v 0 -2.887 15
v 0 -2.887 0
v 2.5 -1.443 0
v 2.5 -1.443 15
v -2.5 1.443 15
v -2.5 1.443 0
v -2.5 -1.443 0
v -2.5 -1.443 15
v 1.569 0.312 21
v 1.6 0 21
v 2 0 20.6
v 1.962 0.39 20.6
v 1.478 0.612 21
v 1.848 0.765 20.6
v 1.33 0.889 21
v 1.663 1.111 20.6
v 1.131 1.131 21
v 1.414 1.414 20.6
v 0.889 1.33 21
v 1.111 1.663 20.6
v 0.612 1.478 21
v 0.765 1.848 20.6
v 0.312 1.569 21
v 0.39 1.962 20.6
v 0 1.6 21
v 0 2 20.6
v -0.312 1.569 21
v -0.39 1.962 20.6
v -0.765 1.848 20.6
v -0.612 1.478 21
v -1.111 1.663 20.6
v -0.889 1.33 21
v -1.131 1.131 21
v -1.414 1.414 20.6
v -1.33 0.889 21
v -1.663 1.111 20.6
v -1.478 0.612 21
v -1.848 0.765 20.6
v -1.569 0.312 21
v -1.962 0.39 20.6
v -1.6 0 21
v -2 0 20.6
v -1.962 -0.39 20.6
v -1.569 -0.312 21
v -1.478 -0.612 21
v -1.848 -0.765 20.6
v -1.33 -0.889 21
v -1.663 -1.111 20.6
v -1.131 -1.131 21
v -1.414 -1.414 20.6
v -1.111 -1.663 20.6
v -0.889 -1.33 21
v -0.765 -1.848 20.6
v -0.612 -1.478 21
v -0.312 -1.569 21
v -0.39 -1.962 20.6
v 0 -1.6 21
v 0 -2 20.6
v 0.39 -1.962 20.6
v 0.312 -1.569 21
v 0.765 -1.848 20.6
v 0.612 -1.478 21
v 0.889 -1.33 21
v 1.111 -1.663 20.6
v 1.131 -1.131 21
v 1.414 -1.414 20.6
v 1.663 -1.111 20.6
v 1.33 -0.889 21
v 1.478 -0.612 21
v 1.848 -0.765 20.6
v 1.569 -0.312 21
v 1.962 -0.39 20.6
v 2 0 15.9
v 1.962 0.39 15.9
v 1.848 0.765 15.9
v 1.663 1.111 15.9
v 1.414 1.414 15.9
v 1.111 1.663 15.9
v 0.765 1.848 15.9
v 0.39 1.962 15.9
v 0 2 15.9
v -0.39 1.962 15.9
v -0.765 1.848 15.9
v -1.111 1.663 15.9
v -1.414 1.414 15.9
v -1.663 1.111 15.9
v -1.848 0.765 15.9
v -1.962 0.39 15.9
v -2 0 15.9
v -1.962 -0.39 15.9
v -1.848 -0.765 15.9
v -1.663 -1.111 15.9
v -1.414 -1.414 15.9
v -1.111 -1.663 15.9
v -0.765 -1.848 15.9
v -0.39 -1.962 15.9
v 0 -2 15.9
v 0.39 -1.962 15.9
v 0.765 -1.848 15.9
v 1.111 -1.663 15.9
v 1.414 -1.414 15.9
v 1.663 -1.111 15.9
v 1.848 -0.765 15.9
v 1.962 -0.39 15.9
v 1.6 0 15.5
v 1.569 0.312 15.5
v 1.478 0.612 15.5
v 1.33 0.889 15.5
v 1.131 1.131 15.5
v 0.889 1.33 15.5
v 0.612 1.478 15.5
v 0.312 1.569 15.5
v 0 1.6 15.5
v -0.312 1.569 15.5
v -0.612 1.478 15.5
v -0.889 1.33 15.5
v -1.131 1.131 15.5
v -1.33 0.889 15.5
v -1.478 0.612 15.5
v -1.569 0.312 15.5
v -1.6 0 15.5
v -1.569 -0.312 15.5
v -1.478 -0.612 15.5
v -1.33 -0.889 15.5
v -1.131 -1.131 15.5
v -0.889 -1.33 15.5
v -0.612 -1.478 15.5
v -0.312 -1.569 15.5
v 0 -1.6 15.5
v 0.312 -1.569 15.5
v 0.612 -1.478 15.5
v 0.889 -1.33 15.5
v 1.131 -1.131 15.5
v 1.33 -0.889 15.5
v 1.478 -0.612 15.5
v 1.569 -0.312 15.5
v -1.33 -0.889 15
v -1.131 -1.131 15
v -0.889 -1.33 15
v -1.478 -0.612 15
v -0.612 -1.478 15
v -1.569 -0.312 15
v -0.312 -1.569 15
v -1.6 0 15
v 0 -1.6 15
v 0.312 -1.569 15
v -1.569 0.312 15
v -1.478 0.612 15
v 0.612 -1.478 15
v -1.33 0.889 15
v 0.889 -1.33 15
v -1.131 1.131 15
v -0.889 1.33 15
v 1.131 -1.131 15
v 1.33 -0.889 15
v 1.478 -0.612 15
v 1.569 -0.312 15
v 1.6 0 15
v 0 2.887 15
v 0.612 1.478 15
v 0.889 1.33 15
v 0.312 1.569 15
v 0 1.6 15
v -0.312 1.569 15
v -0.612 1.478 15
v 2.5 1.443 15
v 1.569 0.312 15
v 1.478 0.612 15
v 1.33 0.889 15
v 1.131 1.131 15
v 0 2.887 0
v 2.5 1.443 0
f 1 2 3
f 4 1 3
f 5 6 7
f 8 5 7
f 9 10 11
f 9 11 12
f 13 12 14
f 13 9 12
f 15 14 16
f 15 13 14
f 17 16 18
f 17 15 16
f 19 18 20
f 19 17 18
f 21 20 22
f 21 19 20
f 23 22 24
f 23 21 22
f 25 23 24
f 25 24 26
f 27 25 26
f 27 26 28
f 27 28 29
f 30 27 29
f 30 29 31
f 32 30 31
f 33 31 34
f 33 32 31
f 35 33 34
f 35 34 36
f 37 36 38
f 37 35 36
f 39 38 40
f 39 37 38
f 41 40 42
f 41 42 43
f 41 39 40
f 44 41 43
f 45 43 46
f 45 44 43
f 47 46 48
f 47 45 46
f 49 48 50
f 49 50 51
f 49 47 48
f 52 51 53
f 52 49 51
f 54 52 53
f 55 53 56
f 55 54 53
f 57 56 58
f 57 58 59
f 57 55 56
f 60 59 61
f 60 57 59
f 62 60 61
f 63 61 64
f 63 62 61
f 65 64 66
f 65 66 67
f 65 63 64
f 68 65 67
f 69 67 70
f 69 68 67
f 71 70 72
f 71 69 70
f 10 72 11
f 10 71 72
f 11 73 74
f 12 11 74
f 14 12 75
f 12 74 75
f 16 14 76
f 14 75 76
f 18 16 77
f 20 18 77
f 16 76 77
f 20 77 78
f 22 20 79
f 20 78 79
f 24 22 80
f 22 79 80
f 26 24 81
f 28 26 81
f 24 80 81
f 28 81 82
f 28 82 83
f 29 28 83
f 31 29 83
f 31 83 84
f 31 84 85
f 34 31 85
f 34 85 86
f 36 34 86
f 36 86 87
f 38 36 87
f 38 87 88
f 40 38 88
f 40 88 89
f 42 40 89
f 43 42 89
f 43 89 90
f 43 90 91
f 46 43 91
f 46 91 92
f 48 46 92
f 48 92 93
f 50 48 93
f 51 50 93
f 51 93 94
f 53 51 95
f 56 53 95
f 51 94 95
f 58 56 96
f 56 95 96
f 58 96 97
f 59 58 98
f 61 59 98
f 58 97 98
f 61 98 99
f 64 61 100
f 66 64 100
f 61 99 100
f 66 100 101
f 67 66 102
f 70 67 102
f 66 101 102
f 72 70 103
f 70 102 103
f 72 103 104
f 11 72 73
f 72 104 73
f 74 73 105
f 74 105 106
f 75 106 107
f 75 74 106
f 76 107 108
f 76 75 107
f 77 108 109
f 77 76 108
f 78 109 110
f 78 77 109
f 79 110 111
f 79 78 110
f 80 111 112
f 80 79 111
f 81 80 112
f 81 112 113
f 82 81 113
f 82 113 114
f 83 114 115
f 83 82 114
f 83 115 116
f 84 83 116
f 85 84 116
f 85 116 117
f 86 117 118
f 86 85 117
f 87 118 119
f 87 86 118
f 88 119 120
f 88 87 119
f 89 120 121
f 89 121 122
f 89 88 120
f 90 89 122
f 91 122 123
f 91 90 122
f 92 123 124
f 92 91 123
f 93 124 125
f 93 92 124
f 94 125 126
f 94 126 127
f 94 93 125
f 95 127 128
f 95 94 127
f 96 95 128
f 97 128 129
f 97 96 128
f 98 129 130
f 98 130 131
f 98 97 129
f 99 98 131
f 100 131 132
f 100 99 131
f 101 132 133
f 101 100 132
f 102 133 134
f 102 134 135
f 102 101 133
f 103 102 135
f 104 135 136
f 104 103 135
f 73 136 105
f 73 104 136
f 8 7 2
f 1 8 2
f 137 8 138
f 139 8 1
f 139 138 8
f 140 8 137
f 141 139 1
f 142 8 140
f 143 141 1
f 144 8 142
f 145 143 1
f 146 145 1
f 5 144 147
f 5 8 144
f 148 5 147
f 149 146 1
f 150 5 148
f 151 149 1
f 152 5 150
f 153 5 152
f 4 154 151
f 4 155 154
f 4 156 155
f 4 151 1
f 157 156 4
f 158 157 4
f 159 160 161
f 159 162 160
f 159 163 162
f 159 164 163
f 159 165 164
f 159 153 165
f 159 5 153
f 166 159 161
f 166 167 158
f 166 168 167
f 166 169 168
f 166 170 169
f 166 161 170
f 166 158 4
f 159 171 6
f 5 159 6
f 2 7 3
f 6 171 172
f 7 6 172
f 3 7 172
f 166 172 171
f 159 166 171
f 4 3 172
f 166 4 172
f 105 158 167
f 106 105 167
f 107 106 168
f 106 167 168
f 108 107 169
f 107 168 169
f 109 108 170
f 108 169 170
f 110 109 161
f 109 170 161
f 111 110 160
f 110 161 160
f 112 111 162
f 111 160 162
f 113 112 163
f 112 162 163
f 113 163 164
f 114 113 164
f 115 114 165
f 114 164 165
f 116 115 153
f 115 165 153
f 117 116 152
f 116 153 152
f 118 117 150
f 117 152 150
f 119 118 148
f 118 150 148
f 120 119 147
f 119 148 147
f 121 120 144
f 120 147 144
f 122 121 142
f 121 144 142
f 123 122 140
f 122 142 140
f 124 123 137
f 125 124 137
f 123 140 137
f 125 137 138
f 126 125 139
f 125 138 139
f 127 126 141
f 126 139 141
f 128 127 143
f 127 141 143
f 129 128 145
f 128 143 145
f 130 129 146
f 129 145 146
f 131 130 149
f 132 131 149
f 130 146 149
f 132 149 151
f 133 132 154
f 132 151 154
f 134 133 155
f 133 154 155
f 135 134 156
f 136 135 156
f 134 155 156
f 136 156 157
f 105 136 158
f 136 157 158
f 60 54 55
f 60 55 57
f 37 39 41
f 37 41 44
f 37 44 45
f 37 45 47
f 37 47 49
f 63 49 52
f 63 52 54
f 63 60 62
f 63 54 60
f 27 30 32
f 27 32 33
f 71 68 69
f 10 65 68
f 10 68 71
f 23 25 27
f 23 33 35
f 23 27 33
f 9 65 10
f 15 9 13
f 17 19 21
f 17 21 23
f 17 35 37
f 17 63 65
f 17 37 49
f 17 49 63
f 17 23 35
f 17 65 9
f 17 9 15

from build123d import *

# Parameters (mm, degrees)
EXTRUDE_1_DEPTH     = 15
SKETCH_2_R          = 2
EXTRUDE_2_DEPTH     = 6
SKETCH_3_R          = 2
SKETCH_3_R_2        = 1.6
CUT_EXTRUDE_3_DEPTH = 0.5
CHAMFER_1_SIZE      = 0.4


with BuildPart() as part:
    # Эскиз1 → Вытянуть1 (new body)
    with BuildSketch(Plane.XY):
        Polygon((0, 2.886751346), (-2.5, 1.443375673), (-2.5, -1.443375673), (0, -2.886751346), (2.5, -1.443375673), (2.5, 1.443375673), align=None)
    extrude(amount=EXTRUDE_1_DEPTH)

    # Эскиз2 → Вытянуть2 (add)
    with BuildSketch(Plane.XY.offset(15)):
        Circle(SKETCH_2_R)
    extrude(amount=EXTRUDE_2_DEPTH)

    # Эскиз3 → Вырез-Вытянуть3 (cut)
    with BuildSketch(Plane.XY.offset(15)):
        Circle(SKETCH_3_R)
        Circle(SKETCH_3_R_2, mode=Mode.SUBTRACT)
    extrude(amount=CUT_EXTRUDE_3_DEPTH, mode=Mode.SUBTRACT)

    # Фаска1
    chamfer_1_edges = [part.edges().sort_by_distance(p)[0] for p in [
        (-2, 0, 21),
        (-2, 0, 15.5),
    ]]
    chamfer(chamfer_1_edges, length=CHAMFER_1_SIZE - 0.0001)  # a hair under: the kernel refuses the full size


solid = part.part
